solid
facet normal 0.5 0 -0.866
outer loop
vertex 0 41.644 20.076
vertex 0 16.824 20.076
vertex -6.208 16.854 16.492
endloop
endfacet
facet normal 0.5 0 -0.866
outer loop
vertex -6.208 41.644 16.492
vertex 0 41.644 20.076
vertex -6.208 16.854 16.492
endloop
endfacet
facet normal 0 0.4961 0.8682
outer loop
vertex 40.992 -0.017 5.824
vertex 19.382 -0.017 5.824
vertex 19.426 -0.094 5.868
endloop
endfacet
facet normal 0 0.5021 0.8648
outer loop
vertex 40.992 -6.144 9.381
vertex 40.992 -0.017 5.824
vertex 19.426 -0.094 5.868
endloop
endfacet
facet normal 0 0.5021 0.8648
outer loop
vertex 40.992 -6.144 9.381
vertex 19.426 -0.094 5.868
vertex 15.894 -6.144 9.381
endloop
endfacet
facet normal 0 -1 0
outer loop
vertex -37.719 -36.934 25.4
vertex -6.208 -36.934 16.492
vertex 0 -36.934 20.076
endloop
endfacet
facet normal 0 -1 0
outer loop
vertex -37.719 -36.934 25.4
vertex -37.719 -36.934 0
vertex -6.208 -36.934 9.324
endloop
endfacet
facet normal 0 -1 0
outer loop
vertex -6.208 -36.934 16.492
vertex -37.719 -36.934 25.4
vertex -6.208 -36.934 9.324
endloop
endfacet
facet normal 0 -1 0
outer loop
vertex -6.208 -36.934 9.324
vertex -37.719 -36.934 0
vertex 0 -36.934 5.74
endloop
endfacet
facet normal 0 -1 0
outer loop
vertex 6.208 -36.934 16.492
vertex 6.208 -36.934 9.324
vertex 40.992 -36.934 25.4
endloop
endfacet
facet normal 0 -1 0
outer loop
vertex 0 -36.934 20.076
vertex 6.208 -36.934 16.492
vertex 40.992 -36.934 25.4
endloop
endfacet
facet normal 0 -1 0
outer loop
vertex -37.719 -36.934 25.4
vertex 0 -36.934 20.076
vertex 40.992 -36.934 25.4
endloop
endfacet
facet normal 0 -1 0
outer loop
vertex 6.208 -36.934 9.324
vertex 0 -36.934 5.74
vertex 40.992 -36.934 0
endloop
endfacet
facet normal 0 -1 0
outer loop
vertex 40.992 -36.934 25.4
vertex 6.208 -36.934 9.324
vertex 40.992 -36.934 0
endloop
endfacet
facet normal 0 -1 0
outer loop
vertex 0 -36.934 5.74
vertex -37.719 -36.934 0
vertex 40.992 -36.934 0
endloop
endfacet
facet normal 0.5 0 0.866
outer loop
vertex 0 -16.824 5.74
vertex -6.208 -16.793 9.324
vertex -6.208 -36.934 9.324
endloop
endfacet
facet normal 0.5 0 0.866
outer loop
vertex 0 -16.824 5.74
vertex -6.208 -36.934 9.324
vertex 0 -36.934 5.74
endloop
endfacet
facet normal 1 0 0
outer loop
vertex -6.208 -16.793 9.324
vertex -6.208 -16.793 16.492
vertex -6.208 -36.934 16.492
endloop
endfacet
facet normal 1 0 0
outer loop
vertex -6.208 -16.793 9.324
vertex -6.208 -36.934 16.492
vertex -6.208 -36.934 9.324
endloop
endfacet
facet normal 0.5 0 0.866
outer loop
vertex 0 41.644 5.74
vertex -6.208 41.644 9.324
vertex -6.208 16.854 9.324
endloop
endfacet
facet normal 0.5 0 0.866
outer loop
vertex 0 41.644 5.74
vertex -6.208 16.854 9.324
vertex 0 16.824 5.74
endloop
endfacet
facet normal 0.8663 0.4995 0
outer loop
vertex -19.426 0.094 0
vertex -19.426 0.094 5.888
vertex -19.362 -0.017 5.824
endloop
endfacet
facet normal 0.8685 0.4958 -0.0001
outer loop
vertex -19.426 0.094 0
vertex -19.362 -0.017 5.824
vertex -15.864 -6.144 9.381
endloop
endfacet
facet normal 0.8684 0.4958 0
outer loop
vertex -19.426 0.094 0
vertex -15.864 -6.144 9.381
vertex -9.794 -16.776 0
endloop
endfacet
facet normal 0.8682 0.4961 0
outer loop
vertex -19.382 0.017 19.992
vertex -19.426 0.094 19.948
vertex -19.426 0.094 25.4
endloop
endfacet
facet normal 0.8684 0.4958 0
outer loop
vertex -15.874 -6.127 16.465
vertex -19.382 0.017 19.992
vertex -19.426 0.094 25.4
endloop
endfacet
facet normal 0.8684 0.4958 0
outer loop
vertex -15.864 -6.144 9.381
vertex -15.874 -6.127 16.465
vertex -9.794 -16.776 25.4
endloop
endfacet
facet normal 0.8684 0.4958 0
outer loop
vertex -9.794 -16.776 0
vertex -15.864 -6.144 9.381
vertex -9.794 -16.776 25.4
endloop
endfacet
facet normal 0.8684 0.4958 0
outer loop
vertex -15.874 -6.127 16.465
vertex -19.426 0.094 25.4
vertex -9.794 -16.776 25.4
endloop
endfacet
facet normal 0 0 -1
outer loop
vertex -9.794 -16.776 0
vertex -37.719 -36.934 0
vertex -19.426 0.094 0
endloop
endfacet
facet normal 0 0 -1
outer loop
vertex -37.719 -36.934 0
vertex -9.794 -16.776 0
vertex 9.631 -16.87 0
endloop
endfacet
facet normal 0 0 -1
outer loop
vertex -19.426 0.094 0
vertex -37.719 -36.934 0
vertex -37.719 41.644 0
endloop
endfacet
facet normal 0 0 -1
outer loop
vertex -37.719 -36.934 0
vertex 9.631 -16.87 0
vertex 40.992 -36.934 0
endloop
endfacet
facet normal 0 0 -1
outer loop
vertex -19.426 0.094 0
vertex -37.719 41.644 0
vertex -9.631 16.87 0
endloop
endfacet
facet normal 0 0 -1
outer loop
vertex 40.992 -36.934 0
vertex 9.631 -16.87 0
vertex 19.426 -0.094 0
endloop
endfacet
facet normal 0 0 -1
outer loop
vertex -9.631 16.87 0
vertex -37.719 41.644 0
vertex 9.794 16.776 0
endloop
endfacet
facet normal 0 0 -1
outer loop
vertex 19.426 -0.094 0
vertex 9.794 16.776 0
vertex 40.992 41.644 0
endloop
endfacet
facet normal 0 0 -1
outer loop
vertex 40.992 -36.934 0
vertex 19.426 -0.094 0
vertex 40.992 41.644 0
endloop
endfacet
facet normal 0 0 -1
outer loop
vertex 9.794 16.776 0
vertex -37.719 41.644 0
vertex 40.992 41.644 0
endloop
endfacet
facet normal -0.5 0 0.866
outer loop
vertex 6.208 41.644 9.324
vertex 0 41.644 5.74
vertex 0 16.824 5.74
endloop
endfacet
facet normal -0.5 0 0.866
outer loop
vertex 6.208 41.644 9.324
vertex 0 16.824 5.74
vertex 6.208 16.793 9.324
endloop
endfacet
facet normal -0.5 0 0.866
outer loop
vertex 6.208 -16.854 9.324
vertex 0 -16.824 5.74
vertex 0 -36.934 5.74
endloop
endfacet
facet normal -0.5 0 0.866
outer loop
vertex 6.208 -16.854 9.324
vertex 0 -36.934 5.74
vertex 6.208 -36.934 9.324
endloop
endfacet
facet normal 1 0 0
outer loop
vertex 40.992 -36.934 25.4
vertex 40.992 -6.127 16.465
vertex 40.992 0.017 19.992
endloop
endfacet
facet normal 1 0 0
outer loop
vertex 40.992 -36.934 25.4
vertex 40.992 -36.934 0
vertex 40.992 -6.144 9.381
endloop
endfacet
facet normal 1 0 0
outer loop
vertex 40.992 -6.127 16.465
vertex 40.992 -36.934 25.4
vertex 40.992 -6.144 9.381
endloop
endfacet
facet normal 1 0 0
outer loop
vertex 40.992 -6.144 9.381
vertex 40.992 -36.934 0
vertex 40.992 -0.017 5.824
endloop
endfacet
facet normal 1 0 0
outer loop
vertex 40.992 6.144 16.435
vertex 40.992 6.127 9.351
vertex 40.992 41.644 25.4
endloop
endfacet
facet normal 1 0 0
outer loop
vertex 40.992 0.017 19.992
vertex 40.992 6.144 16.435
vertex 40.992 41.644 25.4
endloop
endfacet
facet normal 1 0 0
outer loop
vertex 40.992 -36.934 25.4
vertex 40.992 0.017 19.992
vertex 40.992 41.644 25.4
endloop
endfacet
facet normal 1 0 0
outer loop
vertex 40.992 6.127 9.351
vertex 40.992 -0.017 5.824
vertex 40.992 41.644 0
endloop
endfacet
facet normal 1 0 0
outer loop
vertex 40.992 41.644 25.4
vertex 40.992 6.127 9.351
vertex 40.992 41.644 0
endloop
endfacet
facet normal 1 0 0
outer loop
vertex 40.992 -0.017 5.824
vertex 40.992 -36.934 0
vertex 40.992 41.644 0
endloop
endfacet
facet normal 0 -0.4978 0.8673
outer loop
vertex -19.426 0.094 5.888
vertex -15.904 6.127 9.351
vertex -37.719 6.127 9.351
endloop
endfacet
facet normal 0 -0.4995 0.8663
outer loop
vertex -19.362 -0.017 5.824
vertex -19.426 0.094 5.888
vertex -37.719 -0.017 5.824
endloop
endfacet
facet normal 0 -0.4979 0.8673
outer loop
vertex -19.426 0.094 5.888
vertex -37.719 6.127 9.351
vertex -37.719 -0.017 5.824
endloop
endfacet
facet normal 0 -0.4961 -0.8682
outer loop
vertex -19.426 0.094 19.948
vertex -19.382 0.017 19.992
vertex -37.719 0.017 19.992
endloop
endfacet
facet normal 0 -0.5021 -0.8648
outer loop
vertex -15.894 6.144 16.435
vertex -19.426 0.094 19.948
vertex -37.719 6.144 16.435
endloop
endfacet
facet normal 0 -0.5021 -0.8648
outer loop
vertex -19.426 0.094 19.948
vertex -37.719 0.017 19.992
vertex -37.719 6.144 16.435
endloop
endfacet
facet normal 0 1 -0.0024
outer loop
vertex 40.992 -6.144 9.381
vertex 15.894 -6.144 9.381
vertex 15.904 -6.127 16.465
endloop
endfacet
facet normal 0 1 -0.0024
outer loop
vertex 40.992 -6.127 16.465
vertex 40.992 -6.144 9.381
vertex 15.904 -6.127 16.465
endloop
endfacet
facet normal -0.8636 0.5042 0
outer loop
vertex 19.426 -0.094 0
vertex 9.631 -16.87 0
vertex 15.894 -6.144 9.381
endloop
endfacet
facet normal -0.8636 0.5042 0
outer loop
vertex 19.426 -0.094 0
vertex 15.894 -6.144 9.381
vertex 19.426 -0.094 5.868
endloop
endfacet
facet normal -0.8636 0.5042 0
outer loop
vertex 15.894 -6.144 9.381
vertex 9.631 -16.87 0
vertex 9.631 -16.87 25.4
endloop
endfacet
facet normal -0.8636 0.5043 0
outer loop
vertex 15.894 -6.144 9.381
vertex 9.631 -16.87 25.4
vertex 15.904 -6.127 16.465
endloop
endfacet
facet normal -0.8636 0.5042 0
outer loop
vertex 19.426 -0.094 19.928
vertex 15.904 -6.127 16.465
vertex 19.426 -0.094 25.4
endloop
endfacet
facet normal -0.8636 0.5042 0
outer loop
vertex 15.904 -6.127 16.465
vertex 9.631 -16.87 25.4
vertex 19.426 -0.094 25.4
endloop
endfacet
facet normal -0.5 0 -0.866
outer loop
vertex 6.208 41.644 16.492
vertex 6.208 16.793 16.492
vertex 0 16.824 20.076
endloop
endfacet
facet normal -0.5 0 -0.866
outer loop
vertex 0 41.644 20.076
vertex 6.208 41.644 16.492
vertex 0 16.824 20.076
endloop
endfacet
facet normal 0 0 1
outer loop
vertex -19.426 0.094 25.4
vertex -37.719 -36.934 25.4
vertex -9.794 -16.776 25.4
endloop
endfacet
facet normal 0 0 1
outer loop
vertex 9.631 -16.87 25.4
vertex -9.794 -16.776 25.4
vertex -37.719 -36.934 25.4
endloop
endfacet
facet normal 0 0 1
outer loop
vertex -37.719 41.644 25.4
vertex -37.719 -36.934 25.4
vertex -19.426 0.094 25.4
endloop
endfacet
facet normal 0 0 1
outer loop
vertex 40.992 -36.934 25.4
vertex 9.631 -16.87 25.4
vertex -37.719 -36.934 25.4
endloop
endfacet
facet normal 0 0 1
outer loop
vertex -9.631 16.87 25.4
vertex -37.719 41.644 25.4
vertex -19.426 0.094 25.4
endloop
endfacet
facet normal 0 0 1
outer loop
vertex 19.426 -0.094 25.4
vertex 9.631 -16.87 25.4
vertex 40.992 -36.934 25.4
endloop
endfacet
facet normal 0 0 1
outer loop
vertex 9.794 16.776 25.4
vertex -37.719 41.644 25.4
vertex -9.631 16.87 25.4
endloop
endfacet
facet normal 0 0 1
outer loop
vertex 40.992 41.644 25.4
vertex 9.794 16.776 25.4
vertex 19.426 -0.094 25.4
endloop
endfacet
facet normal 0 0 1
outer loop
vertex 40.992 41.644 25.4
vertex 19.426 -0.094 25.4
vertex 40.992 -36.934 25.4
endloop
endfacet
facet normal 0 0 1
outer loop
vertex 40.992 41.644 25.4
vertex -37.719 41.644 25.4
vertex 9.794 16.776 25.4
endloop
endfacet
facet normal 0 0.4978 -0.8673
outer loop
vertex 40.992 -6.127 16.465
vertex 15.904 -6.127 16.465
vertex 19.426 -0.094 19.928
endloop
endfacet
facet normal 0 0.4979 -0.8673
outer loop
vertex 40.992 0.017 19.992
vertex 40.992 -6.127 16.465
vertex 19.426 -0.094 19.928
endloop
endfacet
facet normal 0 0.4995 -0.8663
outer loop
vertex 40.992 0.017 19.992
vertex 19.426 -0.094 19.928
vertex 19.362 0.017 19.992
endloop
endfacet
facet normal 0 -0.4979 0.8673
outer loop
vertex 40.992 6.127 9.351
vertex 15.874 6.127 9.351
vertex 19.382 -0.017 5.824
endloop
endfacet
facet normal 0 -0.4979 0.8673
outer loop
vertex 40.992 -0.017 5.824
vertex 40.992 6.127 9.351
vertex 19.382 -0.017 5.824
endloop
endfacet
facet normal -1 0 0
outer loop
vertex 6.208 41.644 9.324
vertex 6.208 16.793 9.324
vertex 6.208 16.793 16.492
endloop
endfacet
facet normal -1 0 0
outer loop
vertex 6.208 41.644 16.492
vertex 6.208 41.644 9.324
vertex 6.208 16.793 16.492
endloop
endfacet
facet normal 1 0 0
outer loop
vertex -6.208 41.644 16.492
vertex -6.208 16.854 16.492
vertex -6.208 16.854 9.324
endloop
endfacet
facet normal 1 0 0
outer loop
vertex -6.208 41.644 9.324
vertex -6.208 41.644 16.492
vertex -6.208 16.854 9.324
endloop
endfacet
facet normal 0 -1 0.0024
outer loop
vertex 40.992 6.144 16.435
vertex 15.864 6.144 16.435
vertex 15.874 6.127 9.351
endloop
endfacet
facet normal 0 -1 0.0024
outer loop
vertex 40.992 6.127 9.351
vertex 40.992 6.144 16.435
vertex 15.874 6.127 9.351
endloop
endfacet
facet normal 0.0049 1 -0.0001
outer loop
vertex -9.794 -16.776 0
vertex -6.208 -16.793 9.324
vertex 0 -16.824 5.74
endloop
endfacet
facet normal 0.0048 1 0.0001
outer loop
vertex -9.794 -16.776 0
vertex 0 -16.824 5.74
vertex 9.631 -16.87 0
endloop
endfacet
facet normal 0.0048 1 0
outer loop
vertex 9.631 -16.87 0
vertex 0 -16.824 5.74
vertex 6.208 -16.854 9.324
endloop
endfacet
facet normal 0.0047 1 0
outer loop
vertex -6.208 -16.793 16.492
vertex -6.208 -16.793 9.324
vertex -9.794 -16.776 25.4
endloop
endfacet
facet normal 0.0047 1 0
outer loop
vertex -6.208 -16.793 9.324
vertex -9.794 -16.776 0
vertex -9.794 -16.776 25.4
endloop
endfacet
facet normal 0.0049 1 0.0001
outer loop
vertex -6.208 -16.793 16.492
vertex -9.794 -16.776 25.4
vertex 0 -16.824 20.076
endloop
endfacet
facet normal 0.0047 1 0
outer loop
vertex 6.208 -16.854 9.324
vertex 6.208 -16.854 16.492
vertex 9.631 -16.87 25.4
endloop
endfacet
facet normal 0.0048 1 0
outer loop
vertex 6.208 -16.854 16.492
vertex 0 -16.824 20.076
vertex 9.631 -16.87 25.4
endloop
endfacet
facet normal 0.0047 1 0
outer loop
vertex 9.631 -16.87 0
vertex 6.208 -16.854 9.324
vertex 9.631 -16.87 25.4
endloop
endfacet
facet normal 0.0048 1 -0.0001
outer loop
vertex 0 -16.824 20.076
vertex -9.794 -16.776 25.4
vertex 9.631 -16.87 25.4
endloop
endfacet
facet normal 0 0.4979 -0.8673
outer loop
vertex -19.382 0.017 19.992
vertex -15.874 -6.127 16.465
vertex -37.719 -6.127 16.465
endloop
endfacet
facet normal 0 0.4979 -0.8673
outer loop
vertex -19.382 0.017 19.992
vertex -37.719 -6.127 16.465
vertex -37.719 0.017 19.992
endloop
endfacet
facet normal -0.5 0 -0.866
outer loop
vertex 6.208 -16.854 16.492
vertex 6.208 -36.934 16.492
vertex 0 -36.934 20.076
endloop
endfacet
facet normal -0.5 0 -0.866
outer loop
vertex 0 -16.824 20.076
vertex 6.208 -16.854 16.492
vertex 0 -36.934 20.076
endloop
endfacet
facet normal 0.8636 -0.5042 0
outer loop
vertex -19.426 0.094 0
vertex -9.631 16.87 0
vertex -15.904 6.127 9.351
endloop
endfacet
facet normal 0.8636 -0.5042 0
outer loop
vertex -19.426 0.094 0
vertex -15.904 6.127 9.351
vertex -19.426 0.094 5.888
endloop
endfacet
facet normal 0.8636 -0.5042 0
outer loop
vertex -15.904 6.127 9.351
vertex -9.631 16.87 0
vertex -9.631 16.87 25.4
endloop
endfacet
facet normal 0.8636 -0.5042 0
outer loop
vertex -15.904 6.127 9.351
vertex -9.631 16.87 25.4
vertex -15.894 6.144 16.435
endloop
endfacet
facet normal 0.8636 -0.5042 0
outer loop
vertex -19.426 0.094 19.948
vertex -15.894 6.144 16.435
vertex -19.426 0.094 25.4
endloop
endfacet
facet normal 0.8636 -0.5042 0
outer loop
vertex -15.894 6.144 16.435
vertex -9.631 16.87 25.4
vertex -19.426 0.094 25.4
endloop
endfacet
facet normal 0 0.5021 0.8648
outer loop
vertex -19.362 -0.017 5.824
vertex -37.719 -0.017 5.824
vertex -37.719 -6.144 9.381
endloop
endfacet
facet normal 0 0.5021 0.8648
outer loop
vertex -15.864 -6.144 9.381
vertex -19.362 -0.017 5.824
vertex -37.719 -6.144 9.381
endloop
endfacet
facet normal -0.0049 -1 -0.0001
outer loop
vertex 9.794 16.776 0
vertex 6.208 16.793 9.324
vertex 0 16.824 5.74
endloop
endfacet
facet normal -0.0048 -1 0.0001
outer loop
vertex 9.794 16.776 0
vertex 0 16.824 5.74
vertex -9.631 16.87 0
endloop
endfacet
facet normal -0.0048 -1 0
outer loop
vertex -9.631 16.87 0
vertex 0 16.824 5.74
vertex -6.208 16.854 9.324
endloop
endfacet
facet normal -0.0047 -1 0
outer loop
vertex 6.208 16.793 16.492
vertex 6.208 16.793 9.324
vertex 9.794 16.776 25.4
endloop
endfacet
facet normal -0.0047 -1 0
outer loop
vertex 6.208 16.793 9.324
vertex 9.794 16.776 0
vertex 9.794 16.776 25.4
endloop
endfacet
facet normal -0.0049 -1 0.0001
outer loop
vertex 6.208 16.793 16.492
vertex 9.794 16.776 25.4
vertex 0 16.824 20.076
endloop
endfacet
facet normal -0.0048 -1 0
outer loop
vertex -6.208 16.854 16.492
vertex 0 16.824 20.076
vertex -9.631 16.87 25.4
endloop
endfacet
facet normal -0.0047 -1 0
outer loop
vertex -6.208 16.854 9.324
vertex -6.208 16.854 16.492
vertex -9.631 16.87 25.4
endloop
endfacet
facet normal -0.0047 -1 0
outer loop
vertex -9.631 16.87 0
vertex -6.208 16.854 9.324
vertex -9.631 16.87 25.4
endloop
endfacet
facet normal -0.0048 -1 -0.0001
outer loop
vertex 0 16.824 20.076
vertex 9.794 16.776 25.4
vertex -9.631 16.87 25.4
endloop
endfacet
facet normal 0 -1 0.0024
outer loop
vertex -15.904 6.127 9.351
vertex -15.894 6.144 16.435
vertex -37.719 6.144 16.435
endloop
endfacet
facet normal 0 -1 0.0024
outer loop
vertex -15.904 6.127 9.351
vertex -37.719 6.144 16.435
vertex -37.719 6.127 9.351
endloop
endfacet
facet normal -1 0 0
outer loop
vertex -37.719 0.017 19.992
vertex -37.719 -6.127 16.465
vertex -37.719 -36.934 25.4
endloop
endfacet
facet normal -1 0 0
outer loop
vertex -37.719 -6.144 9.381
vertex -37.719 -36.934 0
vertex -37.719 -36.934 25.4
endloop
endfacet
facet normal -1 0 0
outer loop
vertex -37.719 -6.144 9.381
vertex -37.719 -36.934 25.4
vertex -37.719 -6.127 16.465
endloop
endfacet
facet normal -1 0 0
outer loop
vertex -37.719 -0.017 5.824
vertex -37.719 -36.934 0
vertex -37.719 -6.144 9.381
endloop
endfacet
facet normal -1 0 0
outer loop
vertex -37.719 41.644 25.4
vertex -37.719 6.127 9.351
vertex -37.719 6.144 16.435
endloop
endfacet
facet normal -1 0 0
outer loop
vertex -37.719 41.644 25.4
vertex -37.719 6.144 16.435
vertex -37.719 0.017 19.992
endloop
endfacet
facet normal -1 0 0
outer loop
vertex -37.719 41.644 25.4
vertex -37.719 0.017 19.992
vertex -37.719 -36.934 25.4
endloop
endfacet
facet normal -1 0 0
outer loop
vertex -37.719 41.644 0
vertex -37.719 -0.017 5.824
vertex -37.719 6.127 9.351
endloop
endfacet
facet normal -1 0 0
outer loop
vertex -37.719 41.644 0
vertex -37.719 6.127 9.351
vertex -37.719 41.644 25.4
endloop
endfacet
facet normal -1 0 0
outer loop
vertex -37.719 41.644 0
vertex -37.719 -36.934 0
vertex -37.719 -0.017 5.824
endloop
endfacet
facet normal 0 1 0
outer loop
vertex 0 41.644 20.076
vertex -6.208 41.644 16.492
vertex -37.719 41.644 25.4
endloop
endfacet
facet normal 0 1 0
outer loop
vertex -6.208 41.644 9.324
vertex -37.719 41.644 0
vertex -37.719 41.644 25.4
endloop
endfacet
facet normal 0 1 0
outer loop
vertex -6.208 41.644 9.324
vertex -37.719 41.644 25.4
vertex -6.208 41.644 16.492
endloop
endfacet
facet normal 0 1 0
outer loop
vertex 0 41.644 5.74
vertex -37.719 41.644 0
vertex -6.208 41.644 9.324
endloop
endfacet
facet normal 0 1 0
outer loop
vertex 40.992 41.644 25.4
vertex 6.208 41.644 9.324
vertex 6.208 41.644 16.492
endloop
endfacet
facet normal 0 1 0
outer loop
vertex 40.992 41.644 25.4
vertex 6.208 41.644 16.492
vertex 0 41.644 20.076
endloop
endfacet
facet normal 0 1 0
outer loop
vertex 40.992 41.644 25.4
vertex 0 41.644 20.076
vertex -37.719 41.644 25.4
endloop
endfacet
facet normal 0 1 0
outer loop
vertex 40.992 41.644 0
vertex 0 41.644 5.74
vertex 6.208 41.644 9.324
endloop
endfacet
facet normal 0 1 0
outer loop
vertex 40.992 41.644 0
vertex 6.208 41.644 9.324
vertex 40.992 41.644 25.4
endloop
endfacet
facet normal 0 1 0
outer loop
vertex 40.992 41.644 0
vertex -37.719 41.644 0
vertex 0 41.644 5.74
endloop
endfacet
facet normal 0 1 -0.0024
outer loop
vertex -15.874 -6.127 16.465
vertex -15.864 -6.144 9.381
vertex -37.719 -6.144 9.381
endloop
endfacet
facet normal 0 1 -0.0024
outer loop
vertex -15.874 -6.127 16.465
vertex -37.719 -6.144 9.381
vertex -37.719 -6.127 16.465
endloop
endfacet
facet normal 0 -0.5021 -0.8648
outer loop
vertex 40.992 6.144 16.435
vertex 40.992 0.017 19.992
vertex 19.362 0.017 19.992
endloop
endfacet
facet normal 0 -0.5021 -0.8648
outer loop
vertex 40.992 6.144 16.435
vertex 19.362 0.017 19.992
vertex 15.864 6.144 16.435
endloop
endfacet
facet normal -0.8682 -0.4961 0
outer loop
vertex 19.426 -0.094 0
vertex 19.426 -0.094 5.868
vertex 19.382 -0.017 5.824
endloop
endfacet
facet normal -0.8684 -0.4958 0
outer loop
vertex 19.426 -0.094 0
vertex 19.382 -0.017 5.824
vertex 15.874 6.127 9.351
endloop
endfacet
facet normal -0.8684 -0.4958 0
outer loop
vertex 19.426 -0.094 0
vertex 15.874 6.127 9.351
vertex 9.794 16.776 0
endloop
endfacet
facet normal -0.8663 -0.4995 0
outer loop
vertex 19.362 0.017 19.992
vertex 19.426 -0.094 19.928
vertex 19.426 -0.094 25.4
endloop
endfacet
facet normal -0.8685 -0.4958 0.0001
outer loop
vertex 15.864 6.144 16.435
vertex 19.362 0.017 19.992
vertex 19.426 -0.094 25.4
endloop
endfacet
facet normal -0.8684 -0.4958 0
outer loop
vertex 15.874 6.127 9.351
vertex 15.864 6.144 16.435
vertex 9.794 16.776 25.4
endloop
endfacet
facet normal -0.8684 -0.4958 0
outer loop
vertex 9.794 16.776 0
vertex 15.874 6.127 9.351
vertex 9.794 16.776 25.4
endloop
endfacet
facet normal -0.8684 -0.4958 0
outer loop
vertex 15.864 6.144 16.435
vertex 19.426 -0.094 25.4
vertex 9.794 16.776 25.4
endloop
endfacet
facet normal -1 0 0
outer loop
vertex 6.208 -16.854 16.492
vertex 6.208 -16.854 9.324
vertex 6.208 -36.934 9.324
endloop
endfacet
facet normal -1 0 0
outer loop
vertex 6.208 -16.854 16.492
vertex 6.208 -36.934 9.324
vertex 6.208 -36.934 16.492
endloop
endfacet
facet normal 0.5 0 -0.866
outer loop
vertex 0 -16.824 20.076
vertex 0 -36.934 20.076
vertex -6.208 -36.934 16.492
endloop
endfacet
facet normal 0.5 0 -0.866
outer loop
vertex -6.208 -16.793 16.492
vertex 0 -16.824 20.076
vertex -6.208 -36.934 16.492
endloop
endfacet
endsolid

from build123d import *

# Parameters (mm, degrees)
F0_W     = 78.710422
F0_H     = 78.577757
F1_DEPTH = 25.4
F3_DEPTH = 25.4
F5_DEPTH = 78.711422
F7_DEPTH = 78.578757


with BuildPart() as f1:
    # F0 (on Top) → F1 (new body)
    with BuildSketch(Plane.XY):
        with Locations((1.636606, 2.354868)):
            Rectangle(F0_W, F0_H)
    extrude(amount=F1_DEPTH)

    # F2 (on face) → F3 (cut)
    with BuildSketch(Plane.XY.offset(25.4)):
        Polygon((9.63136, -16.870158), (19.425666, -0.094076), (9.794305, 16.776082), (-9.63136, 16.870158), (-19.425666, 0.094076), (-9.794305, -16.776082), align=None)
    extrude(amount=-F3_DEPTH, mode=Mode.SUBTRACT)

    # F4 (on face) → F5 (cut, through all)
    with BuildSketch(Plane(origin=(-37.718605, 0, 0), x_dir=(0, -1, 0), z_dir=(-1, 0, 0))):
        Polygon((6.126571, 16.465323), (-0.017433, 19.992435), (-6.144003, 16.435129), (-6.126571, 9.35071), (0.017433, 5.823597), (6.144003, 9.380904), align=None)
    extrude(amount=-F5_DEPTH, mode=Mode.SUBTRACT)

    # F6 (on face) → F7 (cut, through all)
    with BuildSketch(Plane.XZ.offset(36.934011)):
        Polygon((6.207672, 9.324016), (6.207672, 16.492018), (0, 20.076019), (-6.207672, 16.492018), (-6.207672, 9.324016), (0, 5.740015), align=None)
    extrude(amount=-F7_DEPTH, mode=Mode.SUBTRACT)


solid = f1.part
